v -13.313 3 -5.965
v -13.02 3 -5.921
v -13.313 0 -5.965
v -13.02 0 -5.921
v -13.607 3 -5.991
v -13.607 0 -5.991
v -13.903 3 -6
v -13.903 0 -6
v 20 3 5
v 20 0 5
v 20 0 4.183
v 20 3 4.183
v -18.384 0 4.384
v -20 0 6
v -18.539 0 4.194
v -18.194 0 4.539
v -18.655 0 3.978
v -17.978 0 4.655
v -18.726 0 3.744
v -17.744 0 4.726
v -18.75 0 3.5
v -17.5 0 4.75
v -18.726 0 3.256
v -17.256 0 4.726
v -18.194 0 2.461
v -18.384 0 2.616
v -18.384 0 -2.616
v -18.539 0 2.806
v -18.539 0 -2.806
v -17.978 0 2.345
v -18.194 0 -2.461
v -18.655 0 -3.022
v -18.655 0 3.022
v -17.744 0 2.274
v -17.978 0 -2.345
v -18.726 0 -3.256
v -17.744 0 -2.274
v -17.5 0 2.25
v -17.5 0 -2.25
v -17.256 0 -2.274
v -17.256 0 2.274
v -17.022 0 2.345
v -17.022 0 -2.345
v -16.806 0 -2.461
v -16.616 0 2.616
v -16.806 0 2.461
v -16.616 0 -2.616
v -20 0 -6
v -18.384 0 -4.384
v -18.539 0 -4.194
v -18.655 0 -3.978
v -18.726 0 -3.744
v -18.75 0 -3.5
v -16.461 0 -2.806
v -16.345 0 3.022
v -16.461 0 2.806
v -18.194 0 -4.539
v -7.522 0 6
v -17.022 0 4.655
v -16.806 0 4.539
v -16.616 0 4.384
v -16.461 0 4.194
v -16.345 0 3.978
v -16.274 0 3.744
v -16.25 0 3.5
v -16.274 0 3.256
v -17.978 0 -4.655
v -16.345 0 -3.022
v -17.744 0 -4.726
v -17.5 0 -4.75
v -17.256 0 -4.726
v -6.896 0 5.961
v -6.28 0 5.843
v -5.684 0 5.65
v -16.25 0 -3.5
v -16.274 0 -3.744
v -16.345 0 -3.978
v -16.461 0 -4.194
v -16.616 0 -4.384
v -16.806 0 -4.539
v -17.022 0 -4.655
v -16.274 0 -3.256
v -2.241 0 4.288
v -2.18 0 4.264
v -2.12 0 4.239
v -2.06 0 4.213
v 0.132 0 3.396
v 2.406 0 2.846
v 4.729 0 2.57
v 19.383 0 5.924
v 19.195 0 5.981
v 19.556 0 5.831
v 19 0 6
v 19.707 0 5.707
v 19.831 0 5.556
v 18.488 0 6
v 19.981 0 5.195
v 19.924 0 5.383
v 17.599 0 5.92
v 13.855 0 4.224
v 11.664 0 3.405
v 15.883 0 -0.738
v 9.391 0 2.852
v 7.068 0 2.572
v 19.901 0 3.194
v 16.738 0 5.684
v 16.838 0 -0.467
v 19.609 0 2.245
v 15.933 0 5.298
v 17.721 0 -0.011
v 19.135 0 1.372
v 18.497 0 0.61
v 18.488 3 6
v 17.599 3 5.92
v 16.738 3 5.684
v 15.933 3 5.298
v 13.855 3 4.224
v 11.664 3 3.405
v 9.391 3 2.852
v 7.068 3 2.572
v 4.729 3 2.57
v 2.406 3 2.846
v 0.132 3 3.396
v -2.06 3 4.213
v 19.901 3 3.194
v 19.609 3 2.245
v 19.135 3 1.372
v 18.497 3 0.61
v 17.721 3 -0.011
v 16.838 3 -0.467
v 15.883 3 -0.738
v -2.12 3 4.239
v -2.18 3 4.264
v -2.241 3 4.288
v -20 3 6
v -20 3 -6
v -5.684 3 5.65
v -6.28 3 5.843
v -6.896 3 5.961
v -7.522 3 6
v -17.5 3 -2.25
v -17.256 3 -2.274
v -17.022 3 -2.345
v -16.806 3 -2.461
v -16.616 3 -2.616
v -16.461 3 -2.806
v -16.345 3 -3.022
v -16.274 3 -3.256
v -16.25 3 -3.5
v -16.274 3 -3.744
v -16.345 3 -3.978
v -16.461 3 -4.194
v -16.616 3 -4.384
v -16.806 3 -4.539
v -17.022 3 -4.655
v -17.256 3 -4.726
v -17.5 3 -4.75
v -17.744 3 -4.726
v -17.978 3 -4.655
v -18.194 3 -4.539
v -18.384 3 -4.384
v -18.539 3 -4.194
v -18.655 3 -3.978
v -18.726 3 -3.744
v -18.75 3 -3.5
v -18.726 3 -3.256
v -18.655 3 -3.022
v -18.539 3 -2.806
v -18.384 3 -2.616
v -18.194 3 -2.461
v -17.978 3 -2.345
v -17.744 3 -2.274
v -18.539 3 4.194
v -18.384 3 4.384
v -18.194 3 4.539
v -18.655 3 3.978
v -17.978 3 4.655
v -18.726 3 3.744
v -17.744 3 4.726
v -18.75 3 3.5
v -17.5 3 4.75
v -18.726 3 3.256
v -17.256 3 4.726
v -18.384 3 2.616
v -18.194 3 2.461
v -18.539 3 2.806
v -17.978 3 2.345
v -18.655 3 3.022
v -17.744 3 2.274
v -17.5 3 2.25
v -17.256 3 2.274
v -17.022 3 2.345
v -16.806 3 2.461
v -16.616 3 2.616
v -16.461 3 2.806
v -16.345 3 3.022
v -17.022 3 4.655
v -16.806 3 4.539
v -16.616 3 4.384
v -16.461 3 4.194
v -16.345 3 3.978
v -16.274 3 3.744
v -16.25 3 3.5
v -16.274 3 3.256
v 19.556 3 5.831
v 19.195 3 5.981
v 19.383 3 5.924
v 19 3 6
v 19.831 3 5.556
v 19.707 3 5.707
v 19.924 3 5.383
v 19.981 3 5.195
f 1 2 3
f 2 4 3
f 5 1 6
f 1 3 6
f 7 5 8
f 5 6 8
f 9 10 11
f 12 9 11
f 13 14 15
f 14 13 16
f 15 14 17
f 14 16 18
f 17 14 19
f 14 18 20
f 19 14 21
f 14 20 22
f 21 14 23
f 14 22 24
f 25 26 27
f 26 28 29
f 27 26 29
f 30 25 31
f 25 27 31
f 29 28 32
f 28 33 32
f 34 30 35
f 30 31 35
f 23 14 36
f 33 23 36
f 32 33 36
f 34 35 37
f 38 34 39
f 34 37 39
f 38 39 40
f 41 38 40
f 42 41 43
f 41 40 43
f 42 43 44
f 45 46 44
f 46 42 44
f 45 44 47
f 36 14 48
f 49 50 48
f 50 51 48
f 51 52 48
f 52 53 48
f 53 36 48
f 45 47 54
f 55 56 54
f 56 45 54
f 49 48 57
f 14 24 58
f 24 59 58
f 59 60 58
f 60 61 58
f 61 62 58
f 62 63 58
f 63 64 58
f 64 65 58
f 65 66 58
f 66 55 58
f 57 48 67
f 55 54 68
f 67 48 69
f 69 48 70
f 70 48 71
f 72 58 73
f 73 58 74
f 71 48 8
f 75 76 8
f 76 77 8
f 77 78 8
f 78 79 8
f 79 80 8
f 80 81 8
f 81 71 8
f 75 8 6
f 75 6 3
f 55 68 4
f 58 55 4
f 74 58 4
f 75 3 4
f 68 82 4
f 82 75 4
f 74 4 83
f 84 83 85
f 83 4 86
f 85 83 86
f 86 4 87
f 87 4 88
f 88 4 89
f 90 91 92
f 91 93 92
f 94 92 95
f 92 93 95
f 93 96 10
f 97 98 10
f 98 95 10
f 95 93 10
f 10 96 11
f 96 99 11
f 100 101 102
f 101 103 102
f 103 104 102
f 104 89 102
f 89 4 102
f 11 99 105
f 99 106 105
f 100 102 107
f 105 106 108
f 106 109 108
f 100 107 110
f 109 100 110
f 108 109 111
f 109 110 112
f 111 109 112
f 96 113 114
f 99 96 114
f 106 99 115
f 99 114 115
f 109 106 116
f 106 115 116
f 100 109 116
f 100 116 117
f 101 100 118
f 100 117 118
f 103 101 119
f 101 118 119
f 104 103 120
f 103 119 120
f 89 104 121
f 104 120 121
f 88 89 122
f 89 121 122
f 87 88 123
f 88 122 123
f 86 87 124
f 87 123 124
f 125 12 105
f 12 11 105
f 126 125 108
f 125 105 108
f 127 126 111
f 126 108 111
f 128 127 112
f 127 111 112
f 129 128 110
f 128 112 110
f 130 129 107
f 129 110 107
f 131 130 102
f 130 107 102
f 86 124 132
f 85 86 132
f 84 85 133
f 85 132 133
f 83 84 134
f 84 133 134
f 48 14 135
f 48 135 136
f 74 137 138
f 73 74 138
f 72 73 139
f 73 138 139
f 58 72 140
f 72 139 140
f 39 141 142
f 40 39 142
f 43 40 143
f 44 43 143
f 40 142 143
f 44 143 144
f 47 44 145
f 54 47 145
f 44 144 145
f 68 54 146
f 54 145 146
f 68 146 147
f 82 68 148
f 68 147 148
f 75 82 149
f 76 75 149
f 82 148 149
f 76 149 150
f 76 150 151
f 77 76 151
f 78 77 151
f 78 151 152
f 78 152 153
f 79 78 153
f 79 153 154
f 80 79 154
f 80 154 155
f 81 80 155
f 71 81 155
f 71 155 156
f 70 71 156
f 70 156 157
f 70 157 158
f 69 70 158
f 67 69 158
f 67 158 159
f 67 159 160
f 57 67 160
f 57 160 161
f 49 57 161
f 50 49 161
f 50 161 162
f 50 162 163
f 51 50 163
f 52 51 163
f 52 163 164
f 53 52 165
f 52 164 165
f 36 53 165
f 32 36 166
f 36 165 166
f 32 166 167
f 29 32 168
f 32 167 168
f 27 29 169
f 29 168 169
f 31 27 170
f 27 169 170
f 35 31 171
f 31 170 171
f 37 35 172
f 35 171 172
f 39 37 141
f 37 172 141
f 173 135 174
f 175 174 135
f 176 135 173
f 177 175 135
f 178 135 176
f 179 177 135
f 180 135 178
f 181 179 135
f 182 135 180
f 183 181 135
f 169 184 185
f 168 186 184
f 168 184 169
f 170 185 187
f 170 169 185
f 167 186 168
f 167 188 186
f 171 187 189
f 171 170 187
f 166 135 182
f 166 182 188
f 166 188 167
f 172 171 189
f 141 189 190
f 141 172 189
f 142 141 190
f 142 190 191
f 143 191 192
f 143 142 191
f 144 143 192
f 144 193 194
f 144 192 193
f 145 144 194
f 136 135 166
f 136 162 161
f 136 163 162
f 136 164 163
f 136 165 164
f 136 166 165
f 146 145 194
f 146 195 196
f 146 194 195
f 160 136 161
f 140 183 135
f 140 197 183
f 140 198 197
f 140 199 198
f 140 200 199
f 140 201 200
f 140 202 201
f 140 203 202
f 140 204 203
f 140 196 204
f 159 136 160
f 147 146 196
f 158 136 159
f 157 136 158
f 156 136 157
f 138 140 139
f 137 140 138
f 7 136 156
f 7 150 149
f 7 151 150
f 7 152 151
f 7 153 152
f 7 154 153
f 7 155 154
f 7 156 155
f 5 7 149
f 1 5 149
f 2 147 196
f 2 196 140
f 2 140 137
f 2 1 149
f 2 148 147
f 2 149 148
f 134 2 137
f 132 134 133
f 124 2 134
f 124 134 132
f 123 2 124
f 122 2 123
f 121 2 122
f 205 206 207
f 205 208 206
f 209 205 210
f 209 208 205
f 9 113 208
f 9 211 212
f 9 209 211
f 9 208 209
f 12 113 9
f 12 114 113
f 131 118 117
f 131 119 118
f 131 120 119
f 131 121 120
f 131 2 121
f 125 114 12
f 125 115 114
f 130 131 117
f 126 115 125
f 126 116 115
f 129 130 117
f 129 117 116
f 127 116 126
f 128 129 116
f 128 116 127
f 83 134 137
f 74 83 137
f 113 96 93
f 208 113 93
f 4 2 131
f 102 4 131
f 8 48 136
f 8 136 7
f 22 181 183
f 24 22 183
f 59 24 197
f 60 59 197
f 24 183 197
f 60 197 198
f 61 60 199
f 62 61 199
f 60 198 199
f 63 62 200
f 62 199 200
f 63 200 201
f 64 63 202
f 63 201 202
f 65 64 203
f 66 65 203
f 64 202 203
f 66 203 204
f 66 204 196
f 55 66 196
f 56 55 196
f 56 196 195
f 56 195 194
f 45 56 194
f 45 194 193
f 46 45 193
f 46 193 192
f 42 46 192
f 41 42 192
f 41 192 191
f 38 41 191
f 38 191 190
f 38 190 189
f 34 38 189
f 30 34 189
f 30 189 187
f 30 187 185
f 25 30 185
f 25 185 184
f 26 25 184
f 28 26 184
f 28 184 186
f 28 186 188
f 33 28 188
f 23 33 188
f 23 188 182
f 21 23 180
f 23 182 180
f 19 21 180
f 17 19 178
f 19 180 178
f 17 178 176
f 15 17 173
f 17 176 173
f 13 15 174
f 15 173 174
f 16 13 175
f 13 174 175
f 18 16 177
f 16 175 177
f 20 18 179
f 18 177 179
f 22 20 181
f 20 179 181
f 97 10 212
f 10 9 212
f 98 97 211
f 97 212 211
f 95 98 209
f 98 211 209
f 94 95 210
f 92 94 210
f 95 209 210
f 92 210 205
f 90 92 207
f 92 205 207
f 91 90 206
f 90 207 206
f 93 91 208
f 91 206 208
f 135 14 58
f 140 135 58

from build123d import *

# Parameters (mm, degrees)
SKETCH1_W           = 40
SKETCH1_H           = 12
BOSS_EXTRUDE1_DEPTH = 3
SKETCH3_R           = 1.25
CUT_EXTRUDE2_DEPTH  = 22.09502311
CUT_EXTRUDE3_DEPTH  = 10
FILLET2_R           = 5
FILLET3_R           = 1
FILLET4_R           = 5
FILLET5_R           = 5


with BuildPart() as part:
    # Sketch1 → Boss-Extrude1 (new body)
    with BuildSketch(Plane(origin=(0, 0, 0), x_dir=(1, 0, 0), z_dir=(0, 1, 0))):
        Rectangle(SKETCH1_W, SKETCH1_H)
    extrude(amount=BOSS_EXTRUDE1_DEPTH)

    # Sketch3 → Cut-Extrude2 (cut, through all)
    with BuildSketch(Plane(origin=(0, 3, 0), x_dir=(1, 0, 0), z_dir=(0, 1, 0))):
        with Locations(Location((-17.5, 3.5, 0), (0, 0, 270))):
            Circle(SKETCH3_R)
        with Locations(Location((-17.5, -3.5, 0), (0, 0, 270))):
            Circle(SKETCH3_R)
    extrude(amount=-CUT_EXTRUDE2_DEPTH, mode=Mode.SUBTRACT)

    # Sketch5 → Cut-Extrude3 (cut)
    with BuildSketch(Plane(origin=(0, 3, 0), x_dir=(1, 0, 0), z_dir=(0, 1, 0))):
        with BuildLine():
            Line((-13.458222524, 6), (20, 0))
            Line((20, 0), (20, -6))
            Line((20, -6), (17.030073052, -6))
            ThreePointArc((17.030073052, -6), (7.671541519, -2.617819669), (-2.144608615, -4.250134828))
            Line((-2.144608615, -4.250134828), (-6.569653649, -6))
            Line((-6.569653649, -6), (-13.458222524, -6))
            Line((-13.458222524, -6), (-13.458222524, -10.237178745))
            Line((-13.458222524, -10.237178745), (26.023482417, -9.726914384))
            Line((26.023482417, -9.726914384), (26.023482417, 8.477274399))
            Line((26.023482417, 8.477274399), (-13.458222524, 8.477274399))
            Line((-13.458222524, 8.477274399), (-13.458222524, 6))
        make_face()
    extrude(amount=-CUT_EXTRUDE3_DEPTH, mode=Mode.SUBTRACT)

    # Fillet2
    # the kernel refuses this fillet: 5 mm, written as the material it takes off along each edge
    with BuildSketch(Plane(origin=(-6.569653649, 5.381801612, 6), x_dir=(-1, 0, 0), z_dir=(0, -1, 0))) as fillet2_piece_1:
        with BuildLine():
            CenterArc((FILLET2_R * 0.190544128998, FILLET2_R), FILLET2_R, 248.423891744, 21.576108256)
            Line((-FILLET2_R * 0.17719268457, FILLET2_R * 0.0700700908417), (0, 0))
            Line((0, 0), (FILLET2_R * 0.190544128998, 0))
        make_face()
    extrude(amount=7.763603225, mode=Mode.SUBTRACT)
    with BuildSketch(Plane(origin=(-2.144608615, 3.259446384, 4.250134828), x_dir=(-0.9299299091583175, 0, 0.36773681356753396), z_dir=(0, -1, 0))) as fillet2_piece_2:
        with BuildLine():
            CenterArc((0.103778554, 5), FILLET2_R, 267.749266862, 2.250733138)
            ThreePointArc((-0.092584454, 0.003857331), (-0.046289955, 0.001983199), (0, 0))
            Line((0, 0), (0.103778554, 0))
        make_face()
    extrude(amount=3.518892769, mode=Mode.SUBTRACT)
    with BuildSketch(Plane(origin=(17.030073052, 6.64587884, 6), x_dir=(1, 0, 0), z_dir=(0, -1, 0))) as fillet2_piece_3:
        with BuildLine():
            CenterArc((1.458351536, -5), FILLET2_R, 90, 30.730822568)
            ThreePointArc((-1.096675494, -0.70211251), (-0.542524687, -0.360136055), (0, 0))
            Line((0, 0), (1.458351536, 0))
        make_face()
    extrude(amount=10.291757681, mode=Mode.SUBTRACT)

    # Fillet3
    fillet3_edges = [part.edges().sort_by_distance(p)[0] for p in [
        (20, 1.5, 6),
    ]]
    fillet(fillet3_edges, radius=FILLET3_R)

    # Fillet4
    fillet4_edges = [part.edges().sort_by_distance(p)[0] for p in [
        (20, 1.5, 0),
    ]]
    fillet(fillet4_edges, radius=FILLET4_R)

    # Fillet5
    fillet5_edges = [part.edges().sort_by_distance(p)[0] for p in [
        (-13.458222524, 1.5, -6),
    ]]
    fillet(fillet5_edges, radius=FILLET5_R)


solid = part.part
